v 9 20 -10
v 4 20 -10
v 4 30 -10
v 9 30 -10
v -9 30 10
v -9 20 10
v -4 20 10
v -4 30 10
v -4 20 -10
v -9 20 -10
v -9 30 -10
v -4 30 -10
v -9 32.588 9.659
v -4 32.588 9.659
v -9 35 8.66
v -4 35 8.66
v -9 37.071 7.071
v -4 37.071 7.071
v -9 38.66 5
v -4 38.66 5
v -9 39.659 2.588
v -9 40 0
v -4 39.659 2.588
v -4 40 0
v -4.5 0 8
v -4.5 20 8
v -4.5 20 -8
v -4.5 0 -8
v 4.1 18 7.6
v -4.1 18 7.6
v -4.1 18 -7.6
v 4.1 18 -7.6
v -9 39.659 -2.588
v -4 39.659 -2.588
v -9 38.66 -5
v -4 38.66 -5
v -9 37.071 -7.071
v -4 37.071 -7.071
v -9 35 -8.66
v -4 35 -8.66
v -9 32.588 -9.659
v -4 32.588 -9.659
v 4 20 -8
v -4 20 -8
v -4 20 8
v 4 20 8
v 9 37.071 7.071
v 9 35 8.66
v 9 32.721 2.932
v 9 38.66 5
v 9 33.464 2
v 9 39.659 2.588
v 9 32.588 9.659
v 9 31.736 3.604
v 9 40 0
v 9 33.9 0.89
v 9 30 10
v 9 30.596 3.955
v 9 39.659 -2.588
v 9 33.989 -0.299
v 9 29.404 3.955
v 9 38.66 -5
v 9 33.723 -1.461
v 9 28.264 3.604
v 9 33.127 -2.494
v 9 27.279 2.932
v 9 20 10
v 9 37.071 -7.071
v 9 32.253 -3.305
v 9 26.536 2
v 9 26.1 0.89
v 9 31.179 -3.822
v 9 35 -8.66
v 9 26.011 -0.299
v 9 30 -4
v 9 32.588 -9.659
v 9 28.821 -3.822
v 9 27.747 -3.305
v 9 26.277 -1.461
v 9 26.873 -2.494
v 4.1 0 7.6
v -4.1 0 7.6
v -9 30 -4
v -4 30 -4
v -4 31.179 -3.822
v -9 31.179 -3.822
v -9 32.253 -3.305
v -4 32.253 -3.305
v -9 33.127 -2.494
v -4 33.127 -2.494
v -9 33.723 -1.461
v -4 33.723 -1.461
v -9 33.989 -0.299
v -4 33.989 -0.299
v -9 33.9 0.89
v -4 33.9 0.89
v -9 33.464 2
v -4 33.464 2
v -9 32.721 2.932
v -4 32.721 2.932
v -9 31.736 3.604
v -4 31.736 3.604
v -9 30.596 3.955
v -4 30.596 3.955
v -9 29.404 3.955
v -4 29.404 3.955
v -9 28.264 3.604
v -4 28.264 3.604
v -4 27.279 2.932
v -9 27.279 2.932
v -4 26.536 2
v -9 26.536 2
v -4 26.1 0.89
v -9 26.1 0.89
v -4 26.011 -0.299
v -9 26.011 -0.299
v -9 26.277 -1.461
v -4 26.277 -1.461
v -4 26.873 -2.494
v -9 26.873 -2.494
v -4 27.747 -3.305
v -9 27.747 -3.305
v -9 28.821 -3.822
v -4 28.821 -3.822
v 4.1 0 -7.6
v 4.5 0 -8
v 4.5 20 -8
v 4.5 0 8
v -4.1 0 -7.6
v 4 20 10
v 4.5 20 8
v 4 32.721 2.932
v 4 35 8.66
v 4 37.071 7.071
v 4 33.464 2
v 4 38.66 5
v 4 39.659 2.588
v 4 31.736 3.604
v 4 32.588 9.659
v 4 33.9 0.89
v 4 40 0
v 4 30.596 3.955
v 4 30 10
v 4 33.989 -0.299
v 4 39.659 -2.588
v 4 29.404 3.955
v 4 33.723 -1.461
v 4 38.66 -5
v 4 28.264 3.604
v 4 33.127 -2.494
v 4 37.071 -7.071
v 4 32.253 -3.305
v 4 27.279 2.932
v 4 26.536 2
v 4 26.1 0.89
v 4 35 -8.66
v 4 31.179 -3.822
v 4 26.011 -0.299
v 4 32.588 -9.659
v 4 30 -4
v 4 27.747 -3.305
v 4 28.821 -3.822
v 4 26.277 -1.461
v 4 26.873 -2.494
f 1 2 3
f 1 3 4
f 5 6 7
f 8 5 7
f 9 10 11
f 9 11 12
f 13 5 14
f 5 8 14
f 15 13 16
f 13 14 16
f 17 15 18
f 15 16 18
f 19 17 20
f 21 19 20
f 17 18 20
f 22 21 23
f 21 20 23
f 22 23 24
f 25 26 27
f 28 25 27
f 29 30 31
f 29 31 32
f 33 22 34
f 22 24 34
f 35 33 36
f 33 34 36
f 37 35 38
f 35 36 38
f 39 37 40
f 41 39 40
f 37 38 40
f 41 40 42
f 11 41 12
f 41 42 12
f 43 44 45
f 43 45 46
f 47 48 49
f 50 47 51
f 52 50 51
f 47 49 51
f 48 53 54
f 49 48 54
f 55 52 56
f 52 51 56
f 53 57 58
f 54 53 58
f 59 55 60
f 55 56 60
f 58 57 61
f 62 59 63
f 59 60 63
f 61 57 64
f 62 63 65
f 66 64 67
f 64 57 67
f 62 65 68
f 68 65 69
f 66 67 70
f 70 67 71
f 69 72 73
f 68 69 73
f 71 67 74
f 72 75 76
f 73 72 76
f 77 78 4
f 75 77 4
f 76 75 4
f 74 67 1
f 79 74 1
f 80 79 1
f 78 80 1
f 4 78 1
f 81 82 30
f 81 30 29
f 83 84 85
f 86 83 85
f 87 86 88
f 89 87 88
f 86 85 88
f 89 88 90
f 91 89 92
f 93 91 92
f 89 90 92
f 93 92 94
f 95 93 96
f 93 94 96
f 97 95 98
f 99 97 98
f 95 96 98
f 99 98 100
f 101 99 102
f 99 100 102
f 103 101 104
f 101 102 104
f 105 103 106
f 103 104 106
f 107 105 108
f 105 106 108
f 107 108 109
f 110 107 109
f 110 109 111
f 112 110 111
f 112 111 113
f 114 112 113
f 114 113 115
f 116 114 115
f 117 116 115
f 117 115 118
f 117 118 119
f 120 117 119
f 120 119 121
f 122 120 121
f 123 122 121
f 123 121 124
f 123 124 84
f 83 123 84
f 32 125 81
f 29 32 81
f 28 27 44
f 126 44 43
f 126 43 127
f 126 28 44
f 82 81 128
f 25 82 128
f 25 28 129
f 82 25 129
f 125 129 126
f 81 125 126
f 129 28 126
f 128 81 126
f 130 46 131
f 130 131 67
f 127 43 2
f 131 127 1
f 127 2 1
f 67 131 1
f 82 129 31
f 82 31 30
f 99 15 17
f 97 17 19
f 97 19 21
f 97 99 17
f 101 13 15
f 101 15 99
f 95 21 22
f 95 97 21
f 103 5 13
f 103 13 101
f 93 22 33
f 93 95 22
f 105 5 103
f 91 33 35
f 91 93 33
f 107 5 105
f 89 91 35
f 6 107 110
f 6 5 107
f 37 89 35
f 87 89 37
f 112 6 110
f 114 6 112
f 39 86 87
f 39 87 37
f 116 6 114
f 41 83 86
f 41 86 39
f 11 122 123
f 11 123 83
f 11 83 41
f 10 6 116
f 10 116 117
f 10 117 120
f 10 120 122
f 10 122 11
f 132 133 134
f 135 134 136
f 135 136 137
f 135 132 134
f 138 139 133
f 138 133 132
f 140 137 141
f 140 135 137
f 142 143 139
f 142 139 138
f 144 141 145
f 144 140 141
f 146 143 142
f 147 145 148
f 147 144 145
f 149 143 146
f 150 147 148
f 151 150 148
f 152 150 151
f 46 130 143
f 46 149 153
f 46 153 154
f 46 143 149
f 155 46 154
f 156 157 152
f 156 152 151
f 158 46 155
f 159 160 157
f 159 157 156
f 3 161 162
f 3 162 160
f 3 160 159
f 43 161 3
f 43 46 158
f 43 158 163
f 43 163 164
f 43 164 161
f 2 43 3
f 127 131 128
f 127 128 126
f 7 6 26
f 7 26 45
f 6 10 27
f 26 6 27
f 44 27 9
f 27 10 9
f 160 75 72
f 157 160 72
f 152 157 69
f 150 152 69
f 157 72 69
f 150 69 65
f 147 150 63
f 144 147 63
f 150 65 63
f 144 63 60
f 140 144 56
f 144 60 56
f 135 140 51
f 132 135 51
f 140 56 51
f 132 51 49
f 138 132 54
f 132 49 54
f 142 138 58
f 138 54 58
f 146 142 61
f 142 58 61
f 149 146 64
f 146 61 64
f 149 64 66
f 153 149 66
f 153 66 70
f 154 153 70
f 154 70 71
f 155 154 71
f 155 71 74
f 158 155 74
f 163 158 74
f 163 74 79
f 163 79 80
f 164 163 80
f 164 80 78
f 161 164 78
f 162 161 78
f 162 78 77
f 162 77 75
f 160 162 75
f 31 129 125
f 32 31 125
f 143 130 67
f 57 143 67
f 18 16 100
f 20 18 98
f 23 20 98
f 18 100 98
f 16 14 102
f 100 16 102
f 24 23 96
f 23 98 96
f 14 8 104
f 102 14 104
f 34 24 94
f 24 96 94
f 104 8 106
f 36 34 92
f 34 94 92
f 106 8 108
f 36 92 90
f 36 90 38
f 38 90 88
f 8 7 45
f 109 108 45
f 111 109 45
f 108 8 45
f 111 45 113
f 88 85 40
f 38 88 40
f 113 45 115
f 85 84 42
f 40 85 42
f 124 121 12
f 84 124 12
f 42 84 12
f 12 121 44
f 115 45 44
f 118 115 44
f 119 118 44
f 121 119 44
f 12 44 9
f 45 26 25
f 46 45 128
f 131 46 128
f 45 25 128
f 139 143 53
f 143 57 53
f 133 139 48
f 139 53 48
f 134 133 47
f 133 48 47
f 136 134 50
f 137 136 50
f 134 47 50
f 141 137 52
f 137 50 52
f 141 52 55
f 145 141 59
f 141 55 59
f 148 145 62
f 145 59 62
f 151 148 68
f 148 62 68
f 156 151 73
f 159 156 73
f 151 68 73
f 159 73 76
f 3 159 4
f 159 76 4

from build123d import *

# Parameters (mm, degrees)
SKETCH1_W           = 9
SKETCH1_H           = 16
BOSS_EXTRUDE1_DEPTH = 20
SKETCH2_W           = 8.2
SKETCH2_H           = 15.2
CUT_EXTRUDE1_DEPTH  = 18
SKETCH4_W           = 5
SKETCH4_H           = 20
BOSS_EXTRUDE2_DEPTH = 20
SKETCH5_R           = 4
CUT_EXTRUDE2_DEPTH  = 45.988887517
FILLET1_R           = 10


with BuildPart() as part:
    # Sketch1 → Boss-Extrude1 (new body)
    with BuildSketch(Plane(origin=(0, 0, 0), x_dir=(1, 0, 0), z_dir=(0, 1, 0))):
        Rectangle(SKETCH1_W, SKETCH1_H)
    extrude(amount=BOSS_EXTRUDE1_DEPTH)

    # Sketch2 → Cut-Extrude1 (cut)
    with BuildSketch(Plane.XZ):
        Rectangle(SKETCH2_W, SKETCH2_H)
    extrude(amount=-CUT_EXTRUDE1_DEPTH, mode=Mode.SUBTRACT)

    # Sketch4 → Boss-Extrude2 (add)
    with BuildSketch(Plane(origin=(0, 20, 0), x_dir=(1, 0, 0), z_dir=(0, 1, 0))):
        with Locations((6.5, 0)):
            Rectangle(SKETCH4_W, SKETCH4_H)
        with Locations((-6.5, 0)):
            Rectangle(SKETCH4_W, SKETCH4_H)
    extrude(amount=BOSS_EXTRUDE2_DEPTH)

    # Sketch5 → Cut-Extrude2 (cut, through all)
    with BuildSketch(Plane(origin=(9, 0, 0), x_dir=(0, 0, -1), z_dir=(1, 0, 0))):
        with Locations((0, 30)):
            Circle(SKETCH5_R)
    extrude(amount=-CUT_EXTRUDE2_DEPTH, mode=Mode.SUBTRACT)

    # Fillet1
    fillet1_edges = [part.edges().sort_by_distance(p)[0] for p in [
        (6.5, 40, 10),
        (6.5, 40, -10),
        (-6.5, 40, -10),
        (-6.5, 40, 10),
    ]]
    fillet(fillet1_edges, radius=FILLET1_R - 0.0001)  # a hair under: the kernel refuses the full size


solid = part.part
